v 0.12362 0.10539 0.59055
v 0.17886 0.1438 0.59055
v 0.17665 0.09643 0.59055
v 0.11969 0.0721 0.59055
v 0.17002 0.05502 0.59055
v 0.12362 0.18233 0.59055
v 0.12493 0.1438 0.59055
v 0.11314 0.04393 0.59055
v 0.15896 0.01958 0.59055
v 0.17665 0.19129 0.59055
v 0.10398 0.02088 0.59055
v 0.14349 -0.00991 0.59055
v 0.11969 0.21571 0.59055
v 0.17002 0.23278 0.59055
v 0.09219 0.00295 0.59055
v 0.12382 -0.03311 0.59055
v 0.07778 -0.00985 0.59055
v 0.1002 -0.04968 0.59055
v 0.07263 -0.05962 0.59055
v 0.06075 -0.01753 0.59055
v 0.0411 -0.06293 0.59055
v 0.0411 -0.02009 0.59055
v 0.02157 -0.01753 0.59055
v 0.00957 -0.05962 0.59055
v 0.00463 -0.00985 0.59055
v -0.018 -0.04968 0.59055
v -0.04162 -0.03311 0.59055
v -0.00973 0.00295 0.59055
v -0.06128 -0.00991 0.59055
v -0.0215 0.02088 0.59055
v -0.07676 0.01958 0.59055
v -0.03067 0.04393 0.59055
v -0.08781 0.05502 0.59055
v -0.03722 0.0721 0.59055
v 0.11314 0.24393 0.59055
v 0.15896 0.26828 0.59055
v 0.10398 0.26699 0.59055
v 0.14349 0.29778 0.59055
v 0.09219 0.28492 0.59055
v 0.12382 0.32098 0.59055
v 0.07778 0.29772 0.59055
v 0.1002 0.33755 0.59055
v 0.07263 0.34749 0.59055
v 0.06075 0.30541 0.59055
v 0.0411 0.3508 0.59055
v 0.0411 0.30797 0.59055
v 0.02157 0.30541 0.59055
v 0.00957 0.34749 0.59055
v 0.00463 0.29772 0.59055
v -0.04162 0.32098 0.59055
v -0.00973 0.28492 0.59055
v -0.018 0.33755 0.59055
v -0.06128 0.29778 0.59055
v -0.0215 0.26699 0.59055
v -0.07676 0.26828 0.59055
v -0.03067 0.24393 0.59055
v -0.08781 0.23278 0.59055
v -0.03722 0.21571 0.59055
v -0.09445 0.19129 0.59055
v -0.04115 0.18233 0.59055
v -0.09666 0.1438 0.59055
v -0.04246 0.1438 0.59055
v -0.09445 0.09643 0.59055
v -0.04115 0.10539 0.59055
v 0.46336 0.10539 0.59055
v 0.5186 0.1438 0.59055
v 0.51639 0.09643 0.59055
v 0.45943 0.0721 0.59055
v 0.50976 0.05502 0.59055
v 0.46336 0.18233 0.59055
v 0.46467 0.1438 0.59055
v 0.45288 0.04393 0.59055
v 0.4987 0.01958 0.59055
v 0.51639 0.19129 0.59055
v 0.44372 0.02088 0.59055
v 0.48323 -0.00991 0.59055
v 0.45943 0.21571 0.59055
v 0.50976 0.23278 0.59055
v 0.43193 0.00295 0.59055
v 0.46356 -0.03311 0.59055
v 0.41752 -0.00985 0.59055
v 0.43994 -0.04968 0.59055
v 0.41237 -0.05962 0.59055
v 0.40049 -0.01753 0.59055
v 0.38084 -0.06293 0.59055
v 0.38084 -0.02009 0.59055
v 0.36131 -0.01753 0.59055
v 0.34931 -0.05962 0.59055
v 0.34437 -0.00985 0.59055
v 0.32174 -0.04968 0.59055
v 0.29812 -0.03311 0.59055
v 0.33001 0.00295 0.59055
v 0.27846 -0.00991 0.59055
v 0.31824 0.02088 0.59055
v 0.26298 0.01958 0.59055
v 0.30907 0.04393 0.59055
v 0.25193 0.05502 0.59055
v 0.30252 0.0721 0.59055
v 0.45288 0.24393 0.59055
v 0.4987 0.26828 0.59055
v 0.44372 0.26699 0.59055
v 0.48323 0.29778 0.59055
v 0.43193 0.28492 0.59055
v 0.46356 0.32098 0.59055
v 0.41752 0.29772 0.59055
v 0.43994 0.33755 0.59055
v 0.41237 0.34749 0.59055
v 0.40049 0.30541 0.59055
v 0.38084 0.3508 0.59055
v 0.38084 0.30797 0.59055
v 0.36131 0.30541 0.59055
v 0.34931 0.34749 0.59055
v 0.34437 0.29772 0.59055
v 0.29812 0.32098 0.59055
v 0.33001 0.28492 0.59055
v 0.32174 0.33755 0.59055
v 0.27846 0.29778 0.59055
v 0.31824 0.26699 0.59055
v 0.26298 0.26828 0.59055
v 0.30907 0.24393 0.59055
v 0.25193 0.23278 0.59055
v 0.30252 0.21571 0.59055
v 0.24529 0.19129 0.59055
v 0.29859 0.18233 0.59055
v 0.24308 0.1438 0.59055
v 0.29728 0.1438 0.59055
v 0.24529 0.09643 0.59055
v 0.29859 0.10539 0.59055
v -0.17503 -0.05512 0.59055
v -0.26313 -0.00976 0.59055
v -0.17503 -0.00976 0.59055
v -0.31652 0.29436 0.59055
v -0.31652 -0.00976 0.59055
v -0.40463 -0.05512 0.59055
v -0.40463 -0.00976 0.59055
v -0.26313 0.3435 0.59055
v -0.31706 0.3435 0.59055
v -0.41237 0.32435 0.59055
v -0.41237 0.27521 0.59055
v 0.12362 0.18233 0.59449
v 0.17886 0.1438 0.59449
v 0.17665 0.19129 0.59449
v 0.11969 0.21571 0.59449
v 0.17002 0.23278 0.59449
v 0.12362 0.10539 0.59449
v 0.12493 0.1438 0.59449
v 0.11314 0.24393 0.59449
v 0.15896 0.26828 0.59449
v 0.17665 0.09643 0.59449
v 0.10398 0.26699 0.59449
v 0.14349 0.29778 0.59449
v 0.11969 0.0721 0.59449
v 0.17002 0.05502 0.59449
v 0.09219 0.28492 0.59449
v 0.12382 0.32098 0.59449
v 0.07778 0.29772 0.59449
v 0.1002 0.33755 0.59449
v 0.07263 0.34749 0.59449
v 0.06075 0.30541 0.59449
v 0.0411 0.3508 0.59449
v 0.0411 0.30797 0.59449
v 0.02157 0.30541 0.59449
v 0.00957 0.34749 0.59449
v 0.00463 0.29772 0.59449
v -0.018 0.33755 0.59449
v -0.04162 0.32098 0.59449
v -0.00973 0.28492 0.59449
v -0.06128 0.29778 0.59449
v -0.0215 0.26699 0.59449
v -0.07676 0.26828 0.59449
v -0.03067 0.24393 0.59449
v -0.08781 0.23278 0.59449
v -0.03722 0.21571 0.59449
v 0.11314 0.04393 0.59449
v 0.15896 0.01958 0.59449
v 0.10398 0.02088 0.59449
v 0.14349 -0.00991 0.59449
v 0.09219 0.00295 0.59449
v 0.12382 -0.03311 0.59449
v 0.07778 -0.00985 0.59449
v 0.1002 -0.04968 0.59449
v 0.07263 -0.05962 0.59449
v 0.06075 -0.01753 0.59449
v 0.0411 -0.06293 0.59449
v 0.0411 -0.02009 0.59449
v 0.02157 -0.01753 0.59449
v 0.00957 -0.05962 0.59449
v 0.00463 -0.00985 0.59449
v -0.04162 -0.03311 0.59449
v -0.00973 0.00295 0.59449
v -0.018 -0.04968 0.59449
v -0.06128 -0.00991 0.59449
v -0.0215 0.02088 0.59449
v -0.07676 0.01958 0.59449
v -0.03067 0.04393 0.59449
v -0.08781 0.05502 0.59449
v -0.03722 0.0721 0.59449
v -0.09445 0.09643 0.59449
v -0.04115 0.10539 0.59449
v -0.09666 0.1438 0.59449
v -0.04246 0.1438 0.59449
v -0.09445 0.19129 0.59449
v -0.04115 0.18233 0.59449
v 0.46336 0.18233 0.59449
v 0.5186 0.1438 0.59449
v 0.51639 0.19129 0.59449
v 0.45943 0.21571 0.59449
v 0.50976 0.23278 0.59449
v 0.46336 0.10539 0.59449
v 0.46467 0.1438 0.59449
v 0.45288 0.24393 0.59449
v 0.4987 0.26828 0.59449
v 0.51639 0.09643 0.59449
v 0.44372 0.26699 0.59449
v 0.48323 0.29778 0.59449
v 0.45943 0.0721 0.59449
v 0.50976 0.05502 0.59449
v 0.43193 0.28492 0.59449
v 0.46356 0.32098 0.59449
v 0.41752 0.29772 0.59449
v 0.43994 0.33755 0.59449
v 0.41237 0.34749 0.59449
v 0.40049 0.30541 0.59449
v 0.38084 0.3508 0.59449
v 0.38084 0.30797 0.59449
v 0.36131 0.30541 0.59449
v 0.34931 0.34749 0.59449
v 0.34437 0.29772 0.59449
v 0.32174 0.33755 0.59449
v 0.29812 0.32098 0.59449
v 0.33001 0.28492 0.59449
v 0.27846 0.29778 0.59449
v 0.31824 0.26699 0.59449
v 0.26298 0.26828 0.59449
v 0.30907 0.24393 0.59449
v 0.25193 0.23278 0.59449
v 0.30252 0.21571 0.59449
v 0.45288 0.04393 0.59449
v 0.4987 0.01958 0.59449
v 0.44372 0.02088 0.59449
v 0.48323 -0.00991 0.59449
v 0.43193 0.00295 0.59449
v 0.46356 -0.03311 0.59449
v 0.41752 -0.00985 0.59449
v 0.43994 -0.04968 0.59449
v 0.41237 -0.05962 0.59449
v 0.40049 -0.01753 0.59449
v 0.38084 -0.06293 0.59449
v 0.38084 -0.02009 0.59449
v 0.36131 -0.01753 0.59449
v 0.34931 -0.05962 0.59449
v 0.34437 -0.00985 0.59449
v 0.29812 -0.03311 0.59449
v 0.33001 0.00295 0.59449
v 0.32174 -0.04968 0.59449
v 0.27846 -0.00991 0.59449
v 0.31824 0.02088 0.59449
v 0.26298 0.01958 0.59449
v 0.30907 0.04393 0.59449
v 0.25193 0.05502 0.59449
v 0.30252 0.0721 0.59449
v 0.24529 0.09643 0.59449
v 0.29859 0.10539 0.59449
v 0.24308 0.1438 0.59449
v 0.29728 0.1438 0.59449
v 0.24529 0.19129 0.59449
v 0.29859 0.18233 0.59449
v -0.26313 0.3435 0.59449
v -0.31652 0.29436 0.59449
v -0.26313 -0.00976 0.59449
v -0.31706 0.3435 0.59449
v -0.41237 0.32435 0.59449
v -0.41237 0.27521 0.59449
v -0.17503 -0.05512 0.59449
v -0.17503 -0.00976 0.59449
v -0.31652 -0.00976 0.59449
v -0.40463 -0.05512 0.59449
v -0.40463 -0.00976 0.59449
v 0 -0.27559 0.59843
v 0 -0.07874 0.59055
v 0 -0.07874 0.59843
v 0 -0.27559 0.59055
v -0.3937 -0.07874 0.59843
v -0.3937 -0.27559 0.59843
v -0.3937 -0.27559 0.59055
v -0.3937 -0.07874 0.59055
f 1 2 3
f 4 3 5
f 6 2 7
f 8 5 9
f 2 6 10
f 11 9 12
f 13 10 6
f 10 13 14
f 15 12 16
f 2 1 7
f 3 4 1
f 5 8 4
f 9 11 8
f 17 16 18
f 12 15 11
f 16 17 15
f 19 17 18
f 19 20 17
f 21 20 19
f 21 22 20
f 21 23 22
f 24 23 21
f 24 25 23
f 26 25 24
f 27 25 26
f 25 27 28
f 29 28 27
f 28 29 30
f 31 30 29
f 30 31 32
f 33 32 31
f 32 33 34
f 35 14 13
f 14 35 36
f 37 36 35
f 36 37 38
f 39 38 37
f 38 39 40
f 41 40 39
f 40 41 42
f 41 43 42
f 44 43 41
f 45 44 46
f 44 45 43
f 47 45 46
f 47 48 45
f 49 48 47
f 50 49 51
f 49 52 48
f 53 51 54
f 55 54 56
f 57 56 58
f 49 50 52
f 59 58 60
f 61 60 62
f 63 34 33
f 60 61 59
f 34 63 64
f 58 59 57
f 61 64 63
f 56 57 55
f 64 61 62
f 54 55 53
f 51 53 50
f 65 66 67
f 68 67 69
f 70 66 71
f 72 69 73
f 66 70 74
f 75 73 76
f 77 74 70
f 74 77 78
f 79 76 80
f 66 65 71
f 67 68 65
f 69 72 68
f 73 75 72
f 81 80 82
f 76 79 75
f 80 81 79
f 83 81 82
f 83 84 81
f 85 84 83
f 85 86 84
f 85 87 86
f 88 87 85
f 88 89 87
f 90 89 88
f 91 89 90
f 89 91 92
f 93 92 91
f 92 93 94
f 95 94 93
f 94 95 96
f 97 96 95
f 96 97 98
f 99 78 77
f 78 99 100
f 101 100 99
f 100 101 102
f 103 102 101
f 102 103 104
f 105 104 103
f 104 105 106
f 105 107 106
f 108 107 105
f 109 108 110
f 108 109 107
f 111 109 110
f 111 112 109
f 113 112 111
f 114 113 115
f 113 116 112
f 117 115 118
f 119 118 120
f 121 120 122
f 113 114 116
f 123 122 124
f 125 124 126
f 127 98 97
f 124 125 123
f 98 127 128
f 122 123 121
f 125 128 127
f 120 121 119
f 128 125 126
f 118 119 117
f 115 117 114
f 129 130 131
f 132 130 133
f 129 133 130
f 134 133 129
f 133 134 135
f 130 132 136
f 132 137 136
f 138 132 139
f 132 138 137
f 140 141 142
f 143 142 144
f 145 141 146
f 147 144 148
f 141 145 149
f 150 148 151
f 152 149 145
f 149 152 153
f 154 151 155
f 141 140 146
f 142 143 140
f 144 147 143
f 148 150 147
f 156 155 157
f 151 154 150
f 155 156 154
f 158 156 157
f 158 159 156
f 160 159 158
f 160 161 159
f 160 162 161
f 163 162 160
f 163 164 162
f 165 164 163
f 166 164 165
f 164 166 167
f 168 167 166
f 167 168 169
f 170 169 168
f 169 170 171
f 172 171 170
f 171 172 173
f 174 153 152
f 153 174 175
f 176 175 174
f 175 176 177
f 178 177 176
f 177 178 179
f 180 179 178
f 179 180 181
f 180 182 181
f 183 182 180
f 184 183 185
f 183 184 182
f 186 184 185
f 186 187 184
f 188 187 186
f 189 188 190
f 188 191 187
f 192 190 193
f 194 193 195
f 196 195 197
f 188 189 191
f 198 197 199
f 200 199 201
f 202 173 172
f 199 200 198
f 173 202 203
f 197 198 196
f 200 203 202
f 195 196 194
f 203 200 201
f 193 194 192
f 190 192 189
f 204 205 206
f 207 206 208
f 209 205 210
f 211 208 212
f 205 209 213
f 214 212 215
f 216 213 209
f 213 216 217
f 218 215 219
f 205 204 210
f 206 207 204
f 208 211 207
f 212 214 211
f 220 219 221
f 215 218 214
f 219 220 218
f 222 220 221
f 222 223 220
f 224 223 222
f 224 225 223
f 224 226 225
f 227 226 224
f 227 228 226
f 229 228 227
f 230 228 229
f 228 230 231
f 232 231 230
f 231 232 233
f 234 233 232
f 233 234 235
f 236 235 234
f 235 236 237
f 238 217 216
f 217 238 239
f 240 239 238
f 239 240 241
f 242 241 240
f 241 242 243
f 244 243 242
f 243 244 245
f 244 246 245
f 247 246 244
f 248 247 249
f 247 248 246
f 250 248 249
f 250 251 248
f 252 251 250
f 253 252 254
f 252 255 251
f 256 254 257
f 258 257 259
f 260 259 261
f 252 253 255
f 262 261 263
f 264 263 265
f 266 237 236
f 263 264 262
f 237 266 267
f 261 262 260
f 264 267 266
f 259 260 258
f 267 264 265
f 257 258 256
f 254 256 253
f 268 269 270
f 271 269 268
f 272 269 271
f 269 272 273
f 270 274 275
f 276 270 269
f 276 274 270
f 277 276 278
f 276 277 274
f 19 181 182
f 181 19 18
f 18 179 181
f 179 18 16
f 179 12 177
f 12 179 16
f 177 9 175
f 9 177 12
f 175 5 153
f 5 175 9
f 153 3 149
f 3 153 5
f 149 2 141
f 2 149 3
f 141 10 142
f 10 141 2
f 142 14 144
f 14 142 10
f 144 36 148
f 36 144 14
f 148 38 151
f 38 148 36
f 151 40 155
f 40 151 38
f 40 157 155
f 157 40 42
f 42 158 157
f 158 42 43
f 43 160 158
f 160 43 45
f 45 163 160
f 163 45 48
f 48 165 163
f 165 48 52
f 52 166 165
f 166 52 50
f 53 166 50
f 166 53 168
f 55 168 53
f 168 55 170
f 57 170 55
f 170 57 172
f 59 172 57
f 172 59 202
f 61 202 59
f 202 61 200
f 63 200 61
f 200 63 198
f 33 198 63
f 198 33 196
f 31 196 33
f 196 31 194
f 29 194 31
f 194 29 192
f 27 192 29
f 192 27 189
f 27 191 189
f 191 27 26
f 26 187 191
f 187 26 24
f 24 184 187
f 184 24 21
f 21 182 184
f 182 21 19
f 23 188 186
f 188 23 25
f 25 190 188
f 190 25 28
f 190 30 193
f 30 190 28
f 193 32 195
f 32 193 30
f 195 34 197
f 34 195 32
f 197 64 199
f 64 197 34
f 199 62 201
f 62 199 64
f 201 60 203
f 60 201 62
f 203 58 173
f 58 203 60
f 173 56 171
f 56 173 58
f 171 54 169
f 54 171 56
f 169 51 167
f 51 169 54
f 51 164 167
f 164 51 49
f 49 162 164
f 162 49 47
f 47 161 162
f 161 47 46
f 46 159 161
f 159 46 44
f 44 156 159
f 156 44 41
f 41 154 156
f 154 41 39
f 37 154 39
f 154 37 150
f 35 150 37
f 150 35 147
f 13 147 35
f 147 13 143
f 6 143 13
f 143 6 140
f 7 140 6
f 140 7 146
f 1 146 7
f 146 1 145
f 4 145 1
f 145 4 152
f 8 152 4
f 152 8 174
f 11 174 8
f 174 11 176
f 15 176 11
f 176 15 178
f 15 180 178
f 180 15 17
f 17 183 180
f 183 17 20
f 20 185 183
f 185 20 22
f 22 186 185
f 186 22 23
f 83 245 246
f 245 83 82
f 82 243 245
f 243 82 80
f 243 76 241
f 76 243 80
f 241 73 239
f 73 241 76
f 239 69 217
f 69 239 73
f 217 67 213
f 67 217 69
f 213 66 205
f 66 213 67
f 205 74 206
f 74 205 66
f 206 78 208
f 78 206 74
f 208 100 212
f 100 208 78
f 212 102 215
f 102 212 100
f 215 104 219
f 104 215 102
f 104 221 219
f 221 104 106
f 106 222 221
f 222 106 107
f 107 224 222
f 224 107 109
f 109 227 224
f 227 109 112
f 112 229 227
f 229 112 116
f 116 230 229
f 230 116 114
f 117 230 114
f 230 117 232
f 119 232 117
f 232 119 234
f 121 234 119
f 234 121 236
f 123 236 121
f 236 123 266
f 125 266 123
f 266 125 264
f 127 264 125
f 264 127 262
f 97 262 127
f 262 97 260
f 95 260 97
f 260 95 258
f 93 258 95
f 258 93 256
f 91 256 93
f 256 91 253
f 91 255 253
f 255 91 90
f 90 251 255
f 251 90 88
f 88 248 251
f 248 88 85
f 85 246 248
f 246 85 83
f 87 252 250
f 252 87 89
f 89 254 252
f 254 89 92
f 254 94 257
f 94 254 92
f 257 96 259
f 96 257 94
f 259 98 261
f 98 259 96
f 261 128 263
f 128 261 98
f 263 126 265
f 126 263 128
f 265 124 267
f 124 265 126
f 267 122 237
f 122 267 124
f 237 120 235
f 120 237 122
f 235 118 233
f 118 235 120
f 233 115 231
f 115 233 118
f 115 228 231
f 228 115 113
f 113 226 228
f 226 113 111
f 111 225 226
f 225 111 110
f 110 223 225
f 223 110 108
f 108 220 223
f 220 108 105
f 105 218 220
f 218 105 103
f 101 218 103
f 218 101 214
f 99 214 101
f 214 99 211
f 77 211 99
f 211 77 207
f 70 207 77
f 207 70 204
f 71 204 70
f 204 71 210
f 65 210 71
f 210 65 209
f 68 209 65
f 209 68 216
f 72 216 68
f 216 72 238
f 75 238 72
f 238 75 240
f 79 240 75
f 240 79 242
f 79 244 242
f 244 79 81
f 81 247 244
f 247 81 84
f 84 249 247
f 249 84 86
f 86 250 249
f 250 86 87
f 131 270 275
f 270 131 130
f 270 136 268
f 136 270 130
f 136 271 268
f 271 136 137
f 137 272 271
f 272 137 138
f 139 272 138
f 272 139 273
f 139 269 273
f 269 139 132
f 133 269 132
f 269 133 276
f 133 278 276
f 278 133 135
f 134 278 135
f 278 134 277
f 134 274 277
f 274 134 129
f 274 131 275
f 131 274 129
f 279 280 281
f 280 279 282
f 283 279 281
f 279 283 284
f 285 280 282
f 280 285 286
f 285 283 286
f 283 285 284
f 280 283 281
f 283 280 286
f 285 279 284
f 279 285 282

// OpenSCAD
// file: defines.scad
// example012.stl is Mblock.stl, (c) 2009 Will Langford
// licensed under the Creative Commons - GNU GPL license.
// http://www.thingiverse.com/thing:753

//import("sim800c.stl", convexity=3);

// PCB

L = 3.0;
W = 2.8;
H = 1.5;
e = 1.35;
pin_fragments = 16;

scale = 1/2.54;
// main file
include <defines.scad>

/*font = "Liberation Sans";*/
/*font = "DejaVu";*/
font = "Abyssinica SIL";

// Label
scale(scale) color("White") {

    translate([-L/2.5, -W/20, H]) {
        scale(0.1)
        linear_extrude(height = 0.1, center=false) {
            text("100", font = font);
        }

    }
    translate([-L/3, -W/4, H]) {
        cube(size = [1, 0.5, 0.02], center = false);
    }

}
